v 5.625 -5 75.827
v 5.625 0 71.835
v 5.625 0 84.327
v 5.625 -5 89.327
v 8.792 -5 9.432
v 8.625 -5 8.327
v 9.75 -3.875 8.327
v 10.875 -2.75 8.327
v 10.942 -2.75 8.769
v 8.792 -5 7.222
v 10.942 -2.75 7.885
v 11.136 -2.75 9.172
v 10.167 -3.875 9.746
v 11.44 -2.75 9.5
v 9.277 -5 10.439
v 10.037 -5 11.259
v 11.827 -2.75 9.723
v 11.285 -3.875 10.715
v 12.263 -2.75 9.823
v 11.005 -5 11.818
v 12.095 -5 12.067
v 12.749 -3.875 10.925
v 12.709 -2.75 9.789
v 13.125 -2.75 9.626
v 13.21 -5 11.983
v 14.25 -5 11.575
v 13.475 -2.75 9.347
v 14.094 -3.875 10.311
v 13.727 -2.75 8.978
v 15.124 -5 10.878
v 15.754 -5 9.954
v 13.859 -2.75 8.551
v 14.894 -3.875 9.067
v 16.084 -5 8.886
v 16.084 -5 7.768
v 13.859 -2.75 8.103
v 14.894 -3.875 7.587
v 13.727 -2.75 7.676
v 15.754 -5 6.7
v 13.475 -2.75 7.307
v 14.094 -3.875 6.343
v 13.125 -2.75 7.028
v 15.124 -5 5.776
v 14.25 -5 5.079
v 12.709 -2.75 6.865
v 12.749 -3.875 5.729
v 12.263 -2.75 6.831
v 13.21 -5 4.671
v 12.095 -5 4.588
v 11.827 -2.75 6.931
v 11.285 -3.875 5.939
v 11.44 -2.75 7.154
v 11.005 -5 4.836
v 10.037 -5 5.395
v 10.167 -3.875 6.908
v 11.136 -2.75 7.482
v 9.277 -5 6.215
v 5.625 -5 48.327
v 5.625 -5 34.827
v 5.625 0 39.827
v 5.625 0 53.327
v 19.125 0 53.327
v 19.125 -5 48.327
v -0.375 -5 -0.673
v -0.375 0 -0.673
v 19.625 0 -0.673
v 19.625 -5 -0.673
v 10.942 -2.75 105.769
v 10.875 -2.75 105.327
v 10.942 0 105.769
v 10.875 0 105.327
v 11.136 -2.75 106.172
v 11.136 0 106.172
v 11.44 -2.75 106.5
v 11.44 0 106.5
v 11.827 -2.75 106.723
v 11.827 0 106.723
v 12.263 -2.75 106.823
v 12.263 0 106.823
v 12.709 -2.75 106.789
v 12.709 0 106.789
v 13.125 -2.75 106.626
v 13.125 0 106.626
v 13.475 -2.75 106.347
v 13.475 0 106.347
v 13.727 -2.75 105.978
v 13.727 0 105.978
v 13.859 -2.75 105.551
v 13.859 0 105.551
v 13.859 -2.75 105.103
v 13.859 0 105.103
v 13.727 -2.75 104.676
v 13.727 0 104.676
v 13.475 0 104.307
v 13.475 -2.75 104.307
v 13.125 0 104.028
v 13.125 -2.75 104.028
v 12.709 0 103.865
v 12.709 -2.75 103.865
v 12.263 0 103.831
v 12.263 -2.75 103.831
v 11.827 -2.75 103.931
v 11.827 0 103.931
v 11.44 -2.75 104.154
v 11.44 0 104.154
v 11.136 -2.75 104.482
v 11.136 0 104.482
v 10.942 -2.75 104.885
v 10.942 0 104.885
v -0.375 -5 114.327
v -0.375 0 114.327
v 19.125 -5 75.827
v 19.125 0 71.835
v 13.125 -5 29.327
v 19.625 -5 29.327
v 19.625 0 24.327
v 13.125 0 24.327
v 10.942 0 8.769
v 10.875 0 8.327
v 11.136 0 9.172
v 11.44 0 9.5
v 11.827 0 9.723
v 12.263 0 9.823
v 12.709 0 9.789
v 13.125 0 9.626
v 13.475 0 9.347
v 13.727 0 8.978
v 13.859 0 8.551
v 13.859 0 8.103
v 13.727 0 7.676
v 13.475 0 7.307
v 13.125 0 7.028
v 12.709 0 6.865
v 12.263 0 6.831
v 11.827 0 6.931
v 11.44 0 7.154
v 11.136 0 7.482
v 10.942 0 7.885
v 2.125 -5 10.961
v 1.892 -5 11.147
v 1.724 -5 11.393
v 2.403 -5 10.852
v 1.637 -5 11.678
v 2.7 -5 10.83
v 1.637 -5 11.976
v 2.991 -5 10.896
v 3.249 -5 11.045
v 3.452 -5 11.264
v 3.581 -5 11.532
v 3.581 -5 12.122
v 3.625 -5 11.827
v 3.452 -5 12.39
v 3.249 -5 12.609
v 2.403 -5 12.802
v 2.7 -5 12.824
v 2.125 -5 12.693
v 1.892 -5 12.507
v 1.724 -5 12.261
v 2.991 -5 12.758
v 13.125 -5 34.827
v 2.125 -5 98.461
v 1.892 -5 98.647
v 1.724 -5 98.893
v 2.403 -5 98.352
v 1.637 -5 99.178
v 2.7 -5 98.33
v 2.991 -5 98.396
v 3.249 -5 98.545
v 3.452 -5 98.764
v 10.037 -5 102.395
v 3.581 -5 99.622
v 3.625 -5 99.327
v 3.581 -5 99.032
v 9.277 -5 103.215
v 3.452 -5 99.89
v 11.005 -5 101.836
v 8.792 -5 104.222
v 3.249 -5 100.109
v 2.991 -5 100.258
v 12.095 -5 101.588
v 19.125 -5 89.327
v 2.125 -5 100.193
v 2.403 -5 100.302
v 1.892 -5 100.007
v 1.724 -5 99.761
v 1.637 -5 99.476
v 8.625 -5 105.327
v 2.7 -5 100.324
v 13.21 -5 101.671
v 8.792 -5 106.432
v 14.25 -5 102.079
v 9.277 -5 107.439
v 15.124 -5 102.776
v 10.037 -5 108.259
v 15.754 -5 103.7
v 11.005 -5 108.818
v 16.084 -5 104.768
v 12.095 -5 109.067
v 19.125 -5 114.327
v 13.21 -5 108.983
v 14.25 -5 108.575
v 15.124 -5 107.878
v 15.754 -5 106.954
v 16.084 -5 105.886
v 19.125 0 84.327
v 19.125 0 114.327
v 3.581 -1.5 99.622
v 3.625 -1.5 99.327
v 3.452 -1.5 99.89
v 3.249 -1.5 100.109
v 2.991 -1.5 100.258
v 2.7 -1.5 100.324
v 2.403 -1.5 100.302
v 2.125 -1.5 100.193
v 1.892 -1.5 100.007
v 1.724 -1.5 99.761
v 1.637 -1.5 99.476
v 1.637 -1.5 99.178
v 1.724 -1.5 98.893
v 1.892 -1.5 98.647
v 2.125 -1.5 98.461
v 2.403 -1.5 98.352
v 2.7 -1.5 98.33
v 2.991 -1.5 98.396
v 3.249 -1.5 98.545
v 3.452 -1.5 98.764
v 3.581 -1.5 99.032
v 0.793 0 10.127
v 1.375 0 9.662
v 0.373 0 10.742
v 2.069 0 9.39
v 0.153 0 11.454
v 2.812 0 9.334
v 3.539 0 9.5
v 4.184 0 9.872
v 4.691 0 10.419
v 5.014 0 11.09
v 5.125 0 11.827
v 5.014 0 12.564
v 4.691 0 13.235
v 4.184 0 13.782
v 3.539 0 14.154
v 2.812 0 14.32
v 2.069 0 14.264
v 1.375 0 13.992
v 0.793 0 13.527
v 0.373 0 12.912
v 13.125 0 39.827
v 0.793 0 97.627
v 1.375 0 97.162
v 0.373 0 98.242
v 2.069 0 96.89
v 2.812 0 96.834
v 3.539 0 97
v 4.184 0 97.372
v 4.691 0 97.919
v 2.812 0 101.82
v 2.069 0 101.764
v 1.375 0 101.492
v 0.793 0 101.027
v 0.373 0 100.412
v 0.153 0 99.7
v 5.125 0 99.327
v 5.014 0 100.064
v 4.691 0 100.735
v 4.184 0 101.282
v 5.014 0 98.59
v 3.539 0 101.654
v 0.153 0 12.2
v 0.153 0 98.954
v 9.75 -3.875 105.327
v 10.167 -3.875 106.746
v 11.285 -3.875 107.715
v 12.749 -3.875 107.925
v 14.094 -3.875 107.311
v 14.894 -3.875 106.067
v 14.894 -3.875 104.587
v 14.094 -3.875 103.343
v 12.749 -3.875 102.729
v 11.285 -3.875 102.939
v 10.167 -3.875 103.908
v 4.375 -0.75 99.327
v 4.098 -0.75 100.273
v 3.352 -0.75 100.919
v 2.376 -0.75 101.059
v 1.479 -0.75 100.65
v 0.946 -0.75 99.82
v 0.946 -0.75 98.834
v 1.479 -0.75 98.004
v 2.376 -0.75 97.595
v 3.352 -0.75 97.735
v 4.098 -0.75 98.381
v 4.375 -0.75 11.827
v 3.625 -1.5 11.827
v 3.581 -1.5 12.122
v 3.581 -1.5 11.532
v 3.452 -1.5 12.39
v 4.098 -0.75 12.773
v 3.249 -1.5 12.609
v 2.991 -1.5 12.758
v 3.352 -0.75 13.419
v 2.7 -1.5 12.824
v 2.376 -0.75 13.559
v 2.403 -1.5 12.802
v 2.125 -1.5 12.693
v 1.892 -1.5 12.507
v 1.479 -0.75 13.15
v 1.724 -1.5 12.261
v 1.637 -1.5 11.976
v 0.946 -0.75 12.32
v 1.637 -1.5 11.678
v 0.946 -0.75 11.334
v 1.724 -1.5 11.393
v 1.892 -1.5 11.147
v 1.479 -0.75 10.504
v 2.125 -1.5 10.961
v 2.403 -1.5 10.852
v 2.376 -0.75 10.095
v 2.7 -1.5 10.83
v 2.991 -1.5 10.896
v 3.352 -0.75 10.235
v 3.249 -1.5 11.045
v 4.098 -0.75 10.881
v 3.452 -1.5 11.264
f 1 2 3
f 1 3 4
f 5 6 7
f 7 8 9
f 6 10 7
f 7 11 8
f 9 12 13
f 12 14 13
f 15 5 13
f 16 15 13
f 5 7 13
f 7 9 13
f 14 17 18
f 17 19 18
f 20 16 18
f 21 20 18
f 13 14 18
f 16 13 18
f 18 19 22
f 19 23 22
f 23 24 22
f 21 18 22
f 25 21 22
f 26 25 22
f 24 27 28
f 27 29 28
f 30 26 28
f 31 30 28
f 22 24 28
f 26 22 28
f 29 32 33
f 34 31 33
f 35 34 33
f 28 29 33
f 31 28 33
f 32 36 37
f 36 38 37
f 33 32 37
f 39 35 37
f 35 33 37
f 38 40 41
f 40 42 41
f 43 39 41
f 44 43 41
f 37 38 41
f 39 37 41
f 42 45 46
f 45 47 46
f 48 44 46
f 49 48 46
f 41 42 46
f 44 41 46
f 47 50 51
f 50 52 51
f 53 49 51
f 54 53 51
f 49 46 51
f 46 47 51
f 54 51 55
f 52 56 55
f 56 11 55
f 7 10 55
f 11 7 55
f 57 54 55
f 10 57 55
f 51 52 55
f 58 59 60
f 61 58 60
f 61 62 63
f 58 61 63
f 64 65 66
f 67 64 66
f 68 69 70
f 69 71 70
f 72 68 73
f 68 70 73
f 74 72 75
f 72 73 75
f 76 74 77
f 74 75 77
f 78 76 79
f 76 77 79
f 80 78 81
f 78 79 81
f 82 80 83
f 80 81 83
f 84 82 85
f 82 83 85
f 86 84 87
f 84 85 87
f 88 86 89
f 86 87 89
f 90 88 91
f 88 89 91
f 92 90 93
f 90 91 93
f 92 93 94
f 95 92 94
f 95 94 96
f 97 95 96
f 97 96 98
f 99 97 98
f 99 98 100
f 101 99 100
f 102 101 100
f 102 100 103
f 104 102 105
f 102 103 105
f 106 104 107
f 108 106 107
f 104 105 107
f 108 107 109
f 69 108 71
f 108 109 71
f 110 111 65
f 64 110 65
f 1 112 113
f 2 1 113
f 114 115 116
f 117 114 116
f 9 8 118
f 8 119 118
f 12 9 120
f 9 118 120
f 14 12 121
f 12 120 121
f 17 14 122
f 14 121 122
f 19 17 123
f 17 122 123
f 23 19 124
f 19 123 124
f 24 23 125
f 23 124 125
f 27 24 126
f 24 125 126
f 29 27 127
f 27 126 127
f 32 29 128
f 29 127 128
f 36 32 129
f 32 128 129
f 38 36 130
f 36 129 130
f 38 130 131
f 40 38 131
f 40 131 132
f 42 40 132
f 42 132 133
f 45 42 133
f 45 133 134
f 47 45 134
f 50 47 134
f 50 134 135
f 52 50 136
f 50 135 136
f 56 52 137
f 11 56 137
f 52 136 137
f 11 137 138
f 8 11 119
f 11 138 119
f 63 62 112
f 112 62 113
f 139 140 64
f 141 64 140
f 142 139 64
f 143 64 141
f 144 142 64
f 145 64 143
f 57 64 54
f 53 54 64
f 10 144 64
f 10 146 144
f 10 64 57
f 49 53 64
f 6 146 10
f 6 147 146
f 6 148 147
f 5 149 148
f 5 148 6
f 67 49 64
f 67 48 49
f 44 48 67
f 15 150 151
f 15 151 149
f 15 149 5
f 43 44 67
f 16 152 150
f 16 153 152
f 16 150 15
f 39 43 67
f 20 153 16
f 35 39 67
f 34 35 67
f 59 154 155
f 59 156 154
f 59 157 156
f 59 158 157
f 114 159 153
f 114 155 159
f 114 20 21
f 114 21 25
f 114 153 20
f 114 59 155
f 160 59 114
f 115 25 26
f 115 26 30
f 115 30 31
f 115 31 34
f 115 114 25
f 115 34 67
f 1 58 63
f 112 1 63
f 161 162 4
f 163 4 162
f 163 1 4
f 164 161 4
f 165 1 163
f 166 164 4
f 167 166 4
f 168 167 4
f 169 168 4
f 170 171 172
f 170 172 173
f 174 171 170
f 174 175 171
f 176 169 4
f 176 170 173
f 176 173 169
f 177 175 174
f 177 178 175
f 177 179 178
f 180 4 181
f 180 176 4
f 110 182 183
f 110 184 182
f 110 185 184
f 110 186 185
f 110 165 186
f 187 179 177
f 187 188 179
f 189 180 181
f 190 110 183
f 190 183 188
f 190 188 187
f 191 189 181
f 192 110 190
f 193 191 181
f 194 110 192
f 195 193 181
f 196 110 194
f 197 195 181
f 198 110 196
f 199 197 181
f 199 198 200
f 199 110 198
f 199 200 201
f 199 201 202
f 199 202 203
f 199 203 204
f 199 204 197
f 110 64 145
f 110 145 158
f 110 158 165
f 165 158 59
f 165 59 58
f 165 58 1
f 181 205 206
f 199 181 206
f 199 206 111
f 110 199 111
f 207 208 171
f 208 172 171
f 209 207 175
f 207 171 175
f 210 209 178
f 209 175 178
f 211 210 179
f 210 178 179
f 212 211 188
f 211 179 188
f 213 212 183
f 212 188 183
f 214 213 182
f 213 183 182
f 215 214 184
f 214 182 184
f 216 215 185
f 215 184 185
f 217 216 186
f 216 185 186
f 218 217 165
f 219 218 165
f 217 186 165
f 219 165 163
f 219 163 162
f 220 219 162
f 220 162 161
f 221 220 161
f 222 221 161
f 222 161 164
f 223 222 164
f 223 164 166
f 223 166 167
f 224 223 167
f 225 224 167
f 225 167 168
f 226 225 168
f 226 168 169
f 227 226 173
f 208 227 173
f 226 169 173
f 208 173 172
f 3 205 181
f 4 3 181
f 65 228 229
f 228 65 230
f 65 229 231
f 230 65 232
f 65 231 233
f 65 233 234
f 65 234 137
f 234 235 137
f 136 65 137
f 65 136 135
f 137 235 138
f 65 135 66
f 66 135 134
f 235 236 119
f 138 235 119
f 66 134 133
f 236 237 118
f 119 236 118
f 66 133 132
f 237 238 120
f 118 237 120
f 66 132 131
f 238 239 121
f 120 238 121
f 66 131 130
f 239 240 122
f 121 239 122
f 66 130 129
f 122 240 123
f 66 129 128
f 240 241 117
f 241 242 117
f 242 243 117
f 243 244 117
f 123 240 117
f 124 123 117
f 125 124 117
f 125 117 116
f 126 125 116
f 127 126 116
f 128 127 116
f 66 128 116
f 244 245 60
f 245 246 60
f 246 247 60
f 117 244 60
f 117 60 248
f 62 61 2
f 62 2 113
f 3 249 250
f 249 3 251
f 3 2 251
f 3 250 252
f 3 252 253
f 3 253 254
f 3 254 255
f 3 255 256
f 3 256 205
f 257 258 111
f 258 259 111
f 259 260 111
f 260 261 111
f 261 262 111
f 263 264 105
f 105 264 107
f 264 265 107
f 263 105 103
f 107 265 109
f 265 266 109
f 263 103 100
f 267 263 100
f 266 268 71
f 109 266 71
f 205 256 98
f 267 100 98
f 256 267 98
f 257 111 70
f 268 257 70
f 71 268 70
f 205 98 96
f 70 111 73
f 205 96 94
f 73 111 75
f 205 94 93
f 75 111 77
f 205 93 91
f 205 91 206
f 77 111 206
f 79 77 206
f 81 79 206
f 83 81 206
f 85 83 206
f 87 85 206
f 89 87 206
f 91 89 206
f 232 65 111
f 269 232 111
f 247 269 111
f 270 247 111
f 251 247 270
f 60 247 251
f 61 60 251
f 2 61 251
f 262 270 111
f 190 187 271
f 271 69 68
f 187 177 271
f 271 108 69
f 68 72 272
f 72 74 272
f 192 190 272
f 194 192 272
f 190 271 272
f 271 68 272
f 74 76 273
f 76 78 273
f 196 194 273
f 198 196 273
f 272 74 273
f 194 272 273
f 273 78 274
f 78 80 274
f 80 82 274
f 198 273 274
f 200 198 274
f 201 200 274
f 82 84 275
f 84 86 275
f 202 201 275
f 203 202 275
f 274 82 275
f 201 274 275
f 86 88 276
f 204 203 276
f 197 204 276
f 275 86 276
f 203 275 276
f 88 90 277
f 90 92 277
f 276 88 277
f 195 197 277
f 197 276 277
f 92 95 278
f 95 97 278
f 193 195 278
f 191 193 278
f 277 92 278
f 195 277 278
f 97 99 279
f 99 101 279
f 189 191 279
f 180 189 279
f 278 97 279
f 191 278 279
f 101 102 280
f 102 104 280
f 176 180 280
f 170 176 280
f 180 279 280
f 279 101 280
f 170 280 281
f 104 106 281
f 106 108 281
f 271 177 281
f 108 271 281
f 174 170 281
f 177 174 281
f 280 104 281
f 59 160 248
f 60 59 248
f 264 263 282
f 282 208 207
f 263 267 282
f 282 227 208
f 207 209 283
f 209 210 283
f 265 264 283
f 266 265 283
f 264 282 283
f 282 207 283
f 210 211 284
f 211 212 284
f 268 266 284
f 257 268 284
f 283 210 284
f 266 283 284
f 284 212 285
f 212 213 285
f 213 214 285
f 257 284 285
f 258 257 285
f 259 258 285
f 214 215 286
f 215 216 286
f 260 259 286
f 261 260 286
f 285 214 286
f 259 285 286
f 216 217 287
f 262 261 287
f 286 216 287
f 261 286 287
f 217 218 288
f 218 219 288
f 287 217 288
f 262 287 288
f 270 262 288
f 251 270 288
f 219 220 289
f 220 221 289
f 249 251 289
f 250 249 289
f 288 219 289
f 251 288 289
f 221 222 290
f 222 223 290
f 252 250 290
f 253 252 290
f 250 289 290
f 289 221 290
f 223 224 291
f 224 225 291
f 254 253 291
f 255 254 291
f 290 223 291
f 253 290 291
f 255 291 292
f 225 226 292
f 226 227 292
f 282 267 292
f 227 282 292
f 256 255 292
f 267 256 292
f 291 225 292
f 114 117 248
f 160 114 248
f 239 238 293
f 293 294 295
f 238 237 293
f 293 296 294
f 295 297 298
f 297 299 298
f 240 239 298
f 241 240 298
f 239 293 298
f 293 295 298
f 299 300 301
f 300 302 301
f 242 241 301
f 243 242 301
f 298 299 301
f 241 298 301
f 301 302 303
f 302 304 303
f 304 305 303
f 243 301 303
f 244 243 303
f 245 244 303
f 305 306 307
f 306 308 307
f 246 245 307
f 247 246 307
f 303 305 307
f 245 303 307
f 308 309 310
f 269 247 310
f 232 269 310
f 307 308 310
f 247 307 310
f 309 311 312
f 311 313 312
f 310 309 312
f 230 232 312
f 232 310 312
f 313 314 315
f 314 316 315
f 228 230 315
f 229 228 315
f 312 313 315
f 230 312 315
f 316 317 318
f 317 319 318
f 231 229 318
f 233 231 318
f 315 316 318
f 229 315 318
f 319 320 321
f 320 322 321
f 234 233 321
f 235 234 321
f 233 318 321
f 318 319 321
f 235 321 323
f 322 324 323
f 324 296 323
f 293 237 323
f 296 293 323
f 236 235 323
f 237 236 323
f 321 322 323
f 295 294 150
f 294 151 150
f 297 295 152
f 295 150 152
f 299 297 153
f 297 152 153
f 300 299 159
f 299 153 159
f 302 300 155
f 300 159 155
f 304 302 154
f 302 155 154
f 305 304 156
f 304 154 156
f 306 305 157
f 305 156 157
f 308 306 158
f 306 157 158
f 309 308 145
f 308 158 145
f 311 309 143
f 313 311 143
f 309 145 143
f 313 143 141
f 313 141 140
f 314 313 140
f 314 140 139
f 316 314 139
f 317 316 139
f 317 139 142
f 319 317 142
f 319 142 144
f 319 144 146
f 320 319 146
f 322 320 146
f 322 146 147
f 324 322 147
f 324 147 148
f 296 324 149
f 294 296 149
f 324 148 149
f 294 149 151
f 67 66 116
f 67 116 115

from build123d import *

# Parameters (mm, degrees)
F1_DEPTH        = 5
F4_DEPTH        = 13.5
F6_DEPTH        = 7.5
F8_DEPTH        = 6.5
F10_D           = 3
F10_CSINK_D     = 7.5
F10_CSINK_ANGLE = 90
F12_D           = 2
F12_CSINK_D     = 5
F12_CSINK_ANGLE = 90


with BuildPart() as f1:
    # F0 (on Front) → F1 (new body)
    with BuildSketch(Plane.XZ):
        Polygon((19.12546, 114.327021), (-0.37454, 114.327021), (-0.37454, -0.672979), (19.62546, -0.672979), (19.62546, 29.327021), (13.12546, 29.327021), (13.12546, 39.827021), (5.62546, 39.827021), (5.62546, 48.327021), (19.12546, 48.327021), (19.12546, 75.827021), (5.62546, 75.827021), (5.62546, 84.327021), (19.12546, 84.327021), align=None)
    extrude(amount=F1_DEPTH)

    # F2 (on face) + F3 (on face) → F4 (cut)
    with BuildSketch(Plane.YZ.offset(19.12546)):
        Polygon((-5, 84.327021), (0, 84.327021), (-5, 89.327021), align=None)
    with BuildSketch(Plane.YZ.offset(19.12546)):
        Polygon((0, 75.827021), (-5, 75.827021), (0, 71.834676), align=None)
        Polygon((0, 53.327021), (-5, 48.327021), (0, 48.327021), align=None)
    extrude(amount=-F4_DEPTH, mode=Mode.SUBTRACT)

    # F5 (on face) → F6 (cut)
    with BuildSketch(Plane.YZ.offset(13.12546)):
        Polygon((-5, 34.827021), (0, 39.827021), (-5, 39.827021), align=None)
    extrude(amount=-F6_DEPTH, mode=Mode.SUBTRACT)

    # F7 (on face) → F8 (cut)
    with BuildSketch(Plane.YZ.offset(19.62546)):
        Polygon((0, 24.327021), (0, 29.327021), (-5, 29.327021), align=None)
    extrude(amount=-F8_DEPTH, mode=Mode.SUBTRACT)

    # F10 (through all)
    with Locations(Plane.XZ.offset(5)):
        with Locations((12.37546, 105.327021), (12.37546, 8.327021)):
            CounterSinkHole(F10_D / 2, F10_CSINK_D / 2, counter_sink_angle=F10_CSINK_ANGLE)

    # F12 (through all)
    with Locations(Plane(origin=(0, 0, 0), x_dir=(-1, 0, 0), z_dir=(0, 1, 0))):
        with Locations((-2.62546, 11.827021), (-2.62546, 99.327021)):
            CounterSinkHole(F12_D / 2, F12_CSINK_D / 2, counter_sink_angle=F12_CSINK_ANGLE)


solid = f1.part
